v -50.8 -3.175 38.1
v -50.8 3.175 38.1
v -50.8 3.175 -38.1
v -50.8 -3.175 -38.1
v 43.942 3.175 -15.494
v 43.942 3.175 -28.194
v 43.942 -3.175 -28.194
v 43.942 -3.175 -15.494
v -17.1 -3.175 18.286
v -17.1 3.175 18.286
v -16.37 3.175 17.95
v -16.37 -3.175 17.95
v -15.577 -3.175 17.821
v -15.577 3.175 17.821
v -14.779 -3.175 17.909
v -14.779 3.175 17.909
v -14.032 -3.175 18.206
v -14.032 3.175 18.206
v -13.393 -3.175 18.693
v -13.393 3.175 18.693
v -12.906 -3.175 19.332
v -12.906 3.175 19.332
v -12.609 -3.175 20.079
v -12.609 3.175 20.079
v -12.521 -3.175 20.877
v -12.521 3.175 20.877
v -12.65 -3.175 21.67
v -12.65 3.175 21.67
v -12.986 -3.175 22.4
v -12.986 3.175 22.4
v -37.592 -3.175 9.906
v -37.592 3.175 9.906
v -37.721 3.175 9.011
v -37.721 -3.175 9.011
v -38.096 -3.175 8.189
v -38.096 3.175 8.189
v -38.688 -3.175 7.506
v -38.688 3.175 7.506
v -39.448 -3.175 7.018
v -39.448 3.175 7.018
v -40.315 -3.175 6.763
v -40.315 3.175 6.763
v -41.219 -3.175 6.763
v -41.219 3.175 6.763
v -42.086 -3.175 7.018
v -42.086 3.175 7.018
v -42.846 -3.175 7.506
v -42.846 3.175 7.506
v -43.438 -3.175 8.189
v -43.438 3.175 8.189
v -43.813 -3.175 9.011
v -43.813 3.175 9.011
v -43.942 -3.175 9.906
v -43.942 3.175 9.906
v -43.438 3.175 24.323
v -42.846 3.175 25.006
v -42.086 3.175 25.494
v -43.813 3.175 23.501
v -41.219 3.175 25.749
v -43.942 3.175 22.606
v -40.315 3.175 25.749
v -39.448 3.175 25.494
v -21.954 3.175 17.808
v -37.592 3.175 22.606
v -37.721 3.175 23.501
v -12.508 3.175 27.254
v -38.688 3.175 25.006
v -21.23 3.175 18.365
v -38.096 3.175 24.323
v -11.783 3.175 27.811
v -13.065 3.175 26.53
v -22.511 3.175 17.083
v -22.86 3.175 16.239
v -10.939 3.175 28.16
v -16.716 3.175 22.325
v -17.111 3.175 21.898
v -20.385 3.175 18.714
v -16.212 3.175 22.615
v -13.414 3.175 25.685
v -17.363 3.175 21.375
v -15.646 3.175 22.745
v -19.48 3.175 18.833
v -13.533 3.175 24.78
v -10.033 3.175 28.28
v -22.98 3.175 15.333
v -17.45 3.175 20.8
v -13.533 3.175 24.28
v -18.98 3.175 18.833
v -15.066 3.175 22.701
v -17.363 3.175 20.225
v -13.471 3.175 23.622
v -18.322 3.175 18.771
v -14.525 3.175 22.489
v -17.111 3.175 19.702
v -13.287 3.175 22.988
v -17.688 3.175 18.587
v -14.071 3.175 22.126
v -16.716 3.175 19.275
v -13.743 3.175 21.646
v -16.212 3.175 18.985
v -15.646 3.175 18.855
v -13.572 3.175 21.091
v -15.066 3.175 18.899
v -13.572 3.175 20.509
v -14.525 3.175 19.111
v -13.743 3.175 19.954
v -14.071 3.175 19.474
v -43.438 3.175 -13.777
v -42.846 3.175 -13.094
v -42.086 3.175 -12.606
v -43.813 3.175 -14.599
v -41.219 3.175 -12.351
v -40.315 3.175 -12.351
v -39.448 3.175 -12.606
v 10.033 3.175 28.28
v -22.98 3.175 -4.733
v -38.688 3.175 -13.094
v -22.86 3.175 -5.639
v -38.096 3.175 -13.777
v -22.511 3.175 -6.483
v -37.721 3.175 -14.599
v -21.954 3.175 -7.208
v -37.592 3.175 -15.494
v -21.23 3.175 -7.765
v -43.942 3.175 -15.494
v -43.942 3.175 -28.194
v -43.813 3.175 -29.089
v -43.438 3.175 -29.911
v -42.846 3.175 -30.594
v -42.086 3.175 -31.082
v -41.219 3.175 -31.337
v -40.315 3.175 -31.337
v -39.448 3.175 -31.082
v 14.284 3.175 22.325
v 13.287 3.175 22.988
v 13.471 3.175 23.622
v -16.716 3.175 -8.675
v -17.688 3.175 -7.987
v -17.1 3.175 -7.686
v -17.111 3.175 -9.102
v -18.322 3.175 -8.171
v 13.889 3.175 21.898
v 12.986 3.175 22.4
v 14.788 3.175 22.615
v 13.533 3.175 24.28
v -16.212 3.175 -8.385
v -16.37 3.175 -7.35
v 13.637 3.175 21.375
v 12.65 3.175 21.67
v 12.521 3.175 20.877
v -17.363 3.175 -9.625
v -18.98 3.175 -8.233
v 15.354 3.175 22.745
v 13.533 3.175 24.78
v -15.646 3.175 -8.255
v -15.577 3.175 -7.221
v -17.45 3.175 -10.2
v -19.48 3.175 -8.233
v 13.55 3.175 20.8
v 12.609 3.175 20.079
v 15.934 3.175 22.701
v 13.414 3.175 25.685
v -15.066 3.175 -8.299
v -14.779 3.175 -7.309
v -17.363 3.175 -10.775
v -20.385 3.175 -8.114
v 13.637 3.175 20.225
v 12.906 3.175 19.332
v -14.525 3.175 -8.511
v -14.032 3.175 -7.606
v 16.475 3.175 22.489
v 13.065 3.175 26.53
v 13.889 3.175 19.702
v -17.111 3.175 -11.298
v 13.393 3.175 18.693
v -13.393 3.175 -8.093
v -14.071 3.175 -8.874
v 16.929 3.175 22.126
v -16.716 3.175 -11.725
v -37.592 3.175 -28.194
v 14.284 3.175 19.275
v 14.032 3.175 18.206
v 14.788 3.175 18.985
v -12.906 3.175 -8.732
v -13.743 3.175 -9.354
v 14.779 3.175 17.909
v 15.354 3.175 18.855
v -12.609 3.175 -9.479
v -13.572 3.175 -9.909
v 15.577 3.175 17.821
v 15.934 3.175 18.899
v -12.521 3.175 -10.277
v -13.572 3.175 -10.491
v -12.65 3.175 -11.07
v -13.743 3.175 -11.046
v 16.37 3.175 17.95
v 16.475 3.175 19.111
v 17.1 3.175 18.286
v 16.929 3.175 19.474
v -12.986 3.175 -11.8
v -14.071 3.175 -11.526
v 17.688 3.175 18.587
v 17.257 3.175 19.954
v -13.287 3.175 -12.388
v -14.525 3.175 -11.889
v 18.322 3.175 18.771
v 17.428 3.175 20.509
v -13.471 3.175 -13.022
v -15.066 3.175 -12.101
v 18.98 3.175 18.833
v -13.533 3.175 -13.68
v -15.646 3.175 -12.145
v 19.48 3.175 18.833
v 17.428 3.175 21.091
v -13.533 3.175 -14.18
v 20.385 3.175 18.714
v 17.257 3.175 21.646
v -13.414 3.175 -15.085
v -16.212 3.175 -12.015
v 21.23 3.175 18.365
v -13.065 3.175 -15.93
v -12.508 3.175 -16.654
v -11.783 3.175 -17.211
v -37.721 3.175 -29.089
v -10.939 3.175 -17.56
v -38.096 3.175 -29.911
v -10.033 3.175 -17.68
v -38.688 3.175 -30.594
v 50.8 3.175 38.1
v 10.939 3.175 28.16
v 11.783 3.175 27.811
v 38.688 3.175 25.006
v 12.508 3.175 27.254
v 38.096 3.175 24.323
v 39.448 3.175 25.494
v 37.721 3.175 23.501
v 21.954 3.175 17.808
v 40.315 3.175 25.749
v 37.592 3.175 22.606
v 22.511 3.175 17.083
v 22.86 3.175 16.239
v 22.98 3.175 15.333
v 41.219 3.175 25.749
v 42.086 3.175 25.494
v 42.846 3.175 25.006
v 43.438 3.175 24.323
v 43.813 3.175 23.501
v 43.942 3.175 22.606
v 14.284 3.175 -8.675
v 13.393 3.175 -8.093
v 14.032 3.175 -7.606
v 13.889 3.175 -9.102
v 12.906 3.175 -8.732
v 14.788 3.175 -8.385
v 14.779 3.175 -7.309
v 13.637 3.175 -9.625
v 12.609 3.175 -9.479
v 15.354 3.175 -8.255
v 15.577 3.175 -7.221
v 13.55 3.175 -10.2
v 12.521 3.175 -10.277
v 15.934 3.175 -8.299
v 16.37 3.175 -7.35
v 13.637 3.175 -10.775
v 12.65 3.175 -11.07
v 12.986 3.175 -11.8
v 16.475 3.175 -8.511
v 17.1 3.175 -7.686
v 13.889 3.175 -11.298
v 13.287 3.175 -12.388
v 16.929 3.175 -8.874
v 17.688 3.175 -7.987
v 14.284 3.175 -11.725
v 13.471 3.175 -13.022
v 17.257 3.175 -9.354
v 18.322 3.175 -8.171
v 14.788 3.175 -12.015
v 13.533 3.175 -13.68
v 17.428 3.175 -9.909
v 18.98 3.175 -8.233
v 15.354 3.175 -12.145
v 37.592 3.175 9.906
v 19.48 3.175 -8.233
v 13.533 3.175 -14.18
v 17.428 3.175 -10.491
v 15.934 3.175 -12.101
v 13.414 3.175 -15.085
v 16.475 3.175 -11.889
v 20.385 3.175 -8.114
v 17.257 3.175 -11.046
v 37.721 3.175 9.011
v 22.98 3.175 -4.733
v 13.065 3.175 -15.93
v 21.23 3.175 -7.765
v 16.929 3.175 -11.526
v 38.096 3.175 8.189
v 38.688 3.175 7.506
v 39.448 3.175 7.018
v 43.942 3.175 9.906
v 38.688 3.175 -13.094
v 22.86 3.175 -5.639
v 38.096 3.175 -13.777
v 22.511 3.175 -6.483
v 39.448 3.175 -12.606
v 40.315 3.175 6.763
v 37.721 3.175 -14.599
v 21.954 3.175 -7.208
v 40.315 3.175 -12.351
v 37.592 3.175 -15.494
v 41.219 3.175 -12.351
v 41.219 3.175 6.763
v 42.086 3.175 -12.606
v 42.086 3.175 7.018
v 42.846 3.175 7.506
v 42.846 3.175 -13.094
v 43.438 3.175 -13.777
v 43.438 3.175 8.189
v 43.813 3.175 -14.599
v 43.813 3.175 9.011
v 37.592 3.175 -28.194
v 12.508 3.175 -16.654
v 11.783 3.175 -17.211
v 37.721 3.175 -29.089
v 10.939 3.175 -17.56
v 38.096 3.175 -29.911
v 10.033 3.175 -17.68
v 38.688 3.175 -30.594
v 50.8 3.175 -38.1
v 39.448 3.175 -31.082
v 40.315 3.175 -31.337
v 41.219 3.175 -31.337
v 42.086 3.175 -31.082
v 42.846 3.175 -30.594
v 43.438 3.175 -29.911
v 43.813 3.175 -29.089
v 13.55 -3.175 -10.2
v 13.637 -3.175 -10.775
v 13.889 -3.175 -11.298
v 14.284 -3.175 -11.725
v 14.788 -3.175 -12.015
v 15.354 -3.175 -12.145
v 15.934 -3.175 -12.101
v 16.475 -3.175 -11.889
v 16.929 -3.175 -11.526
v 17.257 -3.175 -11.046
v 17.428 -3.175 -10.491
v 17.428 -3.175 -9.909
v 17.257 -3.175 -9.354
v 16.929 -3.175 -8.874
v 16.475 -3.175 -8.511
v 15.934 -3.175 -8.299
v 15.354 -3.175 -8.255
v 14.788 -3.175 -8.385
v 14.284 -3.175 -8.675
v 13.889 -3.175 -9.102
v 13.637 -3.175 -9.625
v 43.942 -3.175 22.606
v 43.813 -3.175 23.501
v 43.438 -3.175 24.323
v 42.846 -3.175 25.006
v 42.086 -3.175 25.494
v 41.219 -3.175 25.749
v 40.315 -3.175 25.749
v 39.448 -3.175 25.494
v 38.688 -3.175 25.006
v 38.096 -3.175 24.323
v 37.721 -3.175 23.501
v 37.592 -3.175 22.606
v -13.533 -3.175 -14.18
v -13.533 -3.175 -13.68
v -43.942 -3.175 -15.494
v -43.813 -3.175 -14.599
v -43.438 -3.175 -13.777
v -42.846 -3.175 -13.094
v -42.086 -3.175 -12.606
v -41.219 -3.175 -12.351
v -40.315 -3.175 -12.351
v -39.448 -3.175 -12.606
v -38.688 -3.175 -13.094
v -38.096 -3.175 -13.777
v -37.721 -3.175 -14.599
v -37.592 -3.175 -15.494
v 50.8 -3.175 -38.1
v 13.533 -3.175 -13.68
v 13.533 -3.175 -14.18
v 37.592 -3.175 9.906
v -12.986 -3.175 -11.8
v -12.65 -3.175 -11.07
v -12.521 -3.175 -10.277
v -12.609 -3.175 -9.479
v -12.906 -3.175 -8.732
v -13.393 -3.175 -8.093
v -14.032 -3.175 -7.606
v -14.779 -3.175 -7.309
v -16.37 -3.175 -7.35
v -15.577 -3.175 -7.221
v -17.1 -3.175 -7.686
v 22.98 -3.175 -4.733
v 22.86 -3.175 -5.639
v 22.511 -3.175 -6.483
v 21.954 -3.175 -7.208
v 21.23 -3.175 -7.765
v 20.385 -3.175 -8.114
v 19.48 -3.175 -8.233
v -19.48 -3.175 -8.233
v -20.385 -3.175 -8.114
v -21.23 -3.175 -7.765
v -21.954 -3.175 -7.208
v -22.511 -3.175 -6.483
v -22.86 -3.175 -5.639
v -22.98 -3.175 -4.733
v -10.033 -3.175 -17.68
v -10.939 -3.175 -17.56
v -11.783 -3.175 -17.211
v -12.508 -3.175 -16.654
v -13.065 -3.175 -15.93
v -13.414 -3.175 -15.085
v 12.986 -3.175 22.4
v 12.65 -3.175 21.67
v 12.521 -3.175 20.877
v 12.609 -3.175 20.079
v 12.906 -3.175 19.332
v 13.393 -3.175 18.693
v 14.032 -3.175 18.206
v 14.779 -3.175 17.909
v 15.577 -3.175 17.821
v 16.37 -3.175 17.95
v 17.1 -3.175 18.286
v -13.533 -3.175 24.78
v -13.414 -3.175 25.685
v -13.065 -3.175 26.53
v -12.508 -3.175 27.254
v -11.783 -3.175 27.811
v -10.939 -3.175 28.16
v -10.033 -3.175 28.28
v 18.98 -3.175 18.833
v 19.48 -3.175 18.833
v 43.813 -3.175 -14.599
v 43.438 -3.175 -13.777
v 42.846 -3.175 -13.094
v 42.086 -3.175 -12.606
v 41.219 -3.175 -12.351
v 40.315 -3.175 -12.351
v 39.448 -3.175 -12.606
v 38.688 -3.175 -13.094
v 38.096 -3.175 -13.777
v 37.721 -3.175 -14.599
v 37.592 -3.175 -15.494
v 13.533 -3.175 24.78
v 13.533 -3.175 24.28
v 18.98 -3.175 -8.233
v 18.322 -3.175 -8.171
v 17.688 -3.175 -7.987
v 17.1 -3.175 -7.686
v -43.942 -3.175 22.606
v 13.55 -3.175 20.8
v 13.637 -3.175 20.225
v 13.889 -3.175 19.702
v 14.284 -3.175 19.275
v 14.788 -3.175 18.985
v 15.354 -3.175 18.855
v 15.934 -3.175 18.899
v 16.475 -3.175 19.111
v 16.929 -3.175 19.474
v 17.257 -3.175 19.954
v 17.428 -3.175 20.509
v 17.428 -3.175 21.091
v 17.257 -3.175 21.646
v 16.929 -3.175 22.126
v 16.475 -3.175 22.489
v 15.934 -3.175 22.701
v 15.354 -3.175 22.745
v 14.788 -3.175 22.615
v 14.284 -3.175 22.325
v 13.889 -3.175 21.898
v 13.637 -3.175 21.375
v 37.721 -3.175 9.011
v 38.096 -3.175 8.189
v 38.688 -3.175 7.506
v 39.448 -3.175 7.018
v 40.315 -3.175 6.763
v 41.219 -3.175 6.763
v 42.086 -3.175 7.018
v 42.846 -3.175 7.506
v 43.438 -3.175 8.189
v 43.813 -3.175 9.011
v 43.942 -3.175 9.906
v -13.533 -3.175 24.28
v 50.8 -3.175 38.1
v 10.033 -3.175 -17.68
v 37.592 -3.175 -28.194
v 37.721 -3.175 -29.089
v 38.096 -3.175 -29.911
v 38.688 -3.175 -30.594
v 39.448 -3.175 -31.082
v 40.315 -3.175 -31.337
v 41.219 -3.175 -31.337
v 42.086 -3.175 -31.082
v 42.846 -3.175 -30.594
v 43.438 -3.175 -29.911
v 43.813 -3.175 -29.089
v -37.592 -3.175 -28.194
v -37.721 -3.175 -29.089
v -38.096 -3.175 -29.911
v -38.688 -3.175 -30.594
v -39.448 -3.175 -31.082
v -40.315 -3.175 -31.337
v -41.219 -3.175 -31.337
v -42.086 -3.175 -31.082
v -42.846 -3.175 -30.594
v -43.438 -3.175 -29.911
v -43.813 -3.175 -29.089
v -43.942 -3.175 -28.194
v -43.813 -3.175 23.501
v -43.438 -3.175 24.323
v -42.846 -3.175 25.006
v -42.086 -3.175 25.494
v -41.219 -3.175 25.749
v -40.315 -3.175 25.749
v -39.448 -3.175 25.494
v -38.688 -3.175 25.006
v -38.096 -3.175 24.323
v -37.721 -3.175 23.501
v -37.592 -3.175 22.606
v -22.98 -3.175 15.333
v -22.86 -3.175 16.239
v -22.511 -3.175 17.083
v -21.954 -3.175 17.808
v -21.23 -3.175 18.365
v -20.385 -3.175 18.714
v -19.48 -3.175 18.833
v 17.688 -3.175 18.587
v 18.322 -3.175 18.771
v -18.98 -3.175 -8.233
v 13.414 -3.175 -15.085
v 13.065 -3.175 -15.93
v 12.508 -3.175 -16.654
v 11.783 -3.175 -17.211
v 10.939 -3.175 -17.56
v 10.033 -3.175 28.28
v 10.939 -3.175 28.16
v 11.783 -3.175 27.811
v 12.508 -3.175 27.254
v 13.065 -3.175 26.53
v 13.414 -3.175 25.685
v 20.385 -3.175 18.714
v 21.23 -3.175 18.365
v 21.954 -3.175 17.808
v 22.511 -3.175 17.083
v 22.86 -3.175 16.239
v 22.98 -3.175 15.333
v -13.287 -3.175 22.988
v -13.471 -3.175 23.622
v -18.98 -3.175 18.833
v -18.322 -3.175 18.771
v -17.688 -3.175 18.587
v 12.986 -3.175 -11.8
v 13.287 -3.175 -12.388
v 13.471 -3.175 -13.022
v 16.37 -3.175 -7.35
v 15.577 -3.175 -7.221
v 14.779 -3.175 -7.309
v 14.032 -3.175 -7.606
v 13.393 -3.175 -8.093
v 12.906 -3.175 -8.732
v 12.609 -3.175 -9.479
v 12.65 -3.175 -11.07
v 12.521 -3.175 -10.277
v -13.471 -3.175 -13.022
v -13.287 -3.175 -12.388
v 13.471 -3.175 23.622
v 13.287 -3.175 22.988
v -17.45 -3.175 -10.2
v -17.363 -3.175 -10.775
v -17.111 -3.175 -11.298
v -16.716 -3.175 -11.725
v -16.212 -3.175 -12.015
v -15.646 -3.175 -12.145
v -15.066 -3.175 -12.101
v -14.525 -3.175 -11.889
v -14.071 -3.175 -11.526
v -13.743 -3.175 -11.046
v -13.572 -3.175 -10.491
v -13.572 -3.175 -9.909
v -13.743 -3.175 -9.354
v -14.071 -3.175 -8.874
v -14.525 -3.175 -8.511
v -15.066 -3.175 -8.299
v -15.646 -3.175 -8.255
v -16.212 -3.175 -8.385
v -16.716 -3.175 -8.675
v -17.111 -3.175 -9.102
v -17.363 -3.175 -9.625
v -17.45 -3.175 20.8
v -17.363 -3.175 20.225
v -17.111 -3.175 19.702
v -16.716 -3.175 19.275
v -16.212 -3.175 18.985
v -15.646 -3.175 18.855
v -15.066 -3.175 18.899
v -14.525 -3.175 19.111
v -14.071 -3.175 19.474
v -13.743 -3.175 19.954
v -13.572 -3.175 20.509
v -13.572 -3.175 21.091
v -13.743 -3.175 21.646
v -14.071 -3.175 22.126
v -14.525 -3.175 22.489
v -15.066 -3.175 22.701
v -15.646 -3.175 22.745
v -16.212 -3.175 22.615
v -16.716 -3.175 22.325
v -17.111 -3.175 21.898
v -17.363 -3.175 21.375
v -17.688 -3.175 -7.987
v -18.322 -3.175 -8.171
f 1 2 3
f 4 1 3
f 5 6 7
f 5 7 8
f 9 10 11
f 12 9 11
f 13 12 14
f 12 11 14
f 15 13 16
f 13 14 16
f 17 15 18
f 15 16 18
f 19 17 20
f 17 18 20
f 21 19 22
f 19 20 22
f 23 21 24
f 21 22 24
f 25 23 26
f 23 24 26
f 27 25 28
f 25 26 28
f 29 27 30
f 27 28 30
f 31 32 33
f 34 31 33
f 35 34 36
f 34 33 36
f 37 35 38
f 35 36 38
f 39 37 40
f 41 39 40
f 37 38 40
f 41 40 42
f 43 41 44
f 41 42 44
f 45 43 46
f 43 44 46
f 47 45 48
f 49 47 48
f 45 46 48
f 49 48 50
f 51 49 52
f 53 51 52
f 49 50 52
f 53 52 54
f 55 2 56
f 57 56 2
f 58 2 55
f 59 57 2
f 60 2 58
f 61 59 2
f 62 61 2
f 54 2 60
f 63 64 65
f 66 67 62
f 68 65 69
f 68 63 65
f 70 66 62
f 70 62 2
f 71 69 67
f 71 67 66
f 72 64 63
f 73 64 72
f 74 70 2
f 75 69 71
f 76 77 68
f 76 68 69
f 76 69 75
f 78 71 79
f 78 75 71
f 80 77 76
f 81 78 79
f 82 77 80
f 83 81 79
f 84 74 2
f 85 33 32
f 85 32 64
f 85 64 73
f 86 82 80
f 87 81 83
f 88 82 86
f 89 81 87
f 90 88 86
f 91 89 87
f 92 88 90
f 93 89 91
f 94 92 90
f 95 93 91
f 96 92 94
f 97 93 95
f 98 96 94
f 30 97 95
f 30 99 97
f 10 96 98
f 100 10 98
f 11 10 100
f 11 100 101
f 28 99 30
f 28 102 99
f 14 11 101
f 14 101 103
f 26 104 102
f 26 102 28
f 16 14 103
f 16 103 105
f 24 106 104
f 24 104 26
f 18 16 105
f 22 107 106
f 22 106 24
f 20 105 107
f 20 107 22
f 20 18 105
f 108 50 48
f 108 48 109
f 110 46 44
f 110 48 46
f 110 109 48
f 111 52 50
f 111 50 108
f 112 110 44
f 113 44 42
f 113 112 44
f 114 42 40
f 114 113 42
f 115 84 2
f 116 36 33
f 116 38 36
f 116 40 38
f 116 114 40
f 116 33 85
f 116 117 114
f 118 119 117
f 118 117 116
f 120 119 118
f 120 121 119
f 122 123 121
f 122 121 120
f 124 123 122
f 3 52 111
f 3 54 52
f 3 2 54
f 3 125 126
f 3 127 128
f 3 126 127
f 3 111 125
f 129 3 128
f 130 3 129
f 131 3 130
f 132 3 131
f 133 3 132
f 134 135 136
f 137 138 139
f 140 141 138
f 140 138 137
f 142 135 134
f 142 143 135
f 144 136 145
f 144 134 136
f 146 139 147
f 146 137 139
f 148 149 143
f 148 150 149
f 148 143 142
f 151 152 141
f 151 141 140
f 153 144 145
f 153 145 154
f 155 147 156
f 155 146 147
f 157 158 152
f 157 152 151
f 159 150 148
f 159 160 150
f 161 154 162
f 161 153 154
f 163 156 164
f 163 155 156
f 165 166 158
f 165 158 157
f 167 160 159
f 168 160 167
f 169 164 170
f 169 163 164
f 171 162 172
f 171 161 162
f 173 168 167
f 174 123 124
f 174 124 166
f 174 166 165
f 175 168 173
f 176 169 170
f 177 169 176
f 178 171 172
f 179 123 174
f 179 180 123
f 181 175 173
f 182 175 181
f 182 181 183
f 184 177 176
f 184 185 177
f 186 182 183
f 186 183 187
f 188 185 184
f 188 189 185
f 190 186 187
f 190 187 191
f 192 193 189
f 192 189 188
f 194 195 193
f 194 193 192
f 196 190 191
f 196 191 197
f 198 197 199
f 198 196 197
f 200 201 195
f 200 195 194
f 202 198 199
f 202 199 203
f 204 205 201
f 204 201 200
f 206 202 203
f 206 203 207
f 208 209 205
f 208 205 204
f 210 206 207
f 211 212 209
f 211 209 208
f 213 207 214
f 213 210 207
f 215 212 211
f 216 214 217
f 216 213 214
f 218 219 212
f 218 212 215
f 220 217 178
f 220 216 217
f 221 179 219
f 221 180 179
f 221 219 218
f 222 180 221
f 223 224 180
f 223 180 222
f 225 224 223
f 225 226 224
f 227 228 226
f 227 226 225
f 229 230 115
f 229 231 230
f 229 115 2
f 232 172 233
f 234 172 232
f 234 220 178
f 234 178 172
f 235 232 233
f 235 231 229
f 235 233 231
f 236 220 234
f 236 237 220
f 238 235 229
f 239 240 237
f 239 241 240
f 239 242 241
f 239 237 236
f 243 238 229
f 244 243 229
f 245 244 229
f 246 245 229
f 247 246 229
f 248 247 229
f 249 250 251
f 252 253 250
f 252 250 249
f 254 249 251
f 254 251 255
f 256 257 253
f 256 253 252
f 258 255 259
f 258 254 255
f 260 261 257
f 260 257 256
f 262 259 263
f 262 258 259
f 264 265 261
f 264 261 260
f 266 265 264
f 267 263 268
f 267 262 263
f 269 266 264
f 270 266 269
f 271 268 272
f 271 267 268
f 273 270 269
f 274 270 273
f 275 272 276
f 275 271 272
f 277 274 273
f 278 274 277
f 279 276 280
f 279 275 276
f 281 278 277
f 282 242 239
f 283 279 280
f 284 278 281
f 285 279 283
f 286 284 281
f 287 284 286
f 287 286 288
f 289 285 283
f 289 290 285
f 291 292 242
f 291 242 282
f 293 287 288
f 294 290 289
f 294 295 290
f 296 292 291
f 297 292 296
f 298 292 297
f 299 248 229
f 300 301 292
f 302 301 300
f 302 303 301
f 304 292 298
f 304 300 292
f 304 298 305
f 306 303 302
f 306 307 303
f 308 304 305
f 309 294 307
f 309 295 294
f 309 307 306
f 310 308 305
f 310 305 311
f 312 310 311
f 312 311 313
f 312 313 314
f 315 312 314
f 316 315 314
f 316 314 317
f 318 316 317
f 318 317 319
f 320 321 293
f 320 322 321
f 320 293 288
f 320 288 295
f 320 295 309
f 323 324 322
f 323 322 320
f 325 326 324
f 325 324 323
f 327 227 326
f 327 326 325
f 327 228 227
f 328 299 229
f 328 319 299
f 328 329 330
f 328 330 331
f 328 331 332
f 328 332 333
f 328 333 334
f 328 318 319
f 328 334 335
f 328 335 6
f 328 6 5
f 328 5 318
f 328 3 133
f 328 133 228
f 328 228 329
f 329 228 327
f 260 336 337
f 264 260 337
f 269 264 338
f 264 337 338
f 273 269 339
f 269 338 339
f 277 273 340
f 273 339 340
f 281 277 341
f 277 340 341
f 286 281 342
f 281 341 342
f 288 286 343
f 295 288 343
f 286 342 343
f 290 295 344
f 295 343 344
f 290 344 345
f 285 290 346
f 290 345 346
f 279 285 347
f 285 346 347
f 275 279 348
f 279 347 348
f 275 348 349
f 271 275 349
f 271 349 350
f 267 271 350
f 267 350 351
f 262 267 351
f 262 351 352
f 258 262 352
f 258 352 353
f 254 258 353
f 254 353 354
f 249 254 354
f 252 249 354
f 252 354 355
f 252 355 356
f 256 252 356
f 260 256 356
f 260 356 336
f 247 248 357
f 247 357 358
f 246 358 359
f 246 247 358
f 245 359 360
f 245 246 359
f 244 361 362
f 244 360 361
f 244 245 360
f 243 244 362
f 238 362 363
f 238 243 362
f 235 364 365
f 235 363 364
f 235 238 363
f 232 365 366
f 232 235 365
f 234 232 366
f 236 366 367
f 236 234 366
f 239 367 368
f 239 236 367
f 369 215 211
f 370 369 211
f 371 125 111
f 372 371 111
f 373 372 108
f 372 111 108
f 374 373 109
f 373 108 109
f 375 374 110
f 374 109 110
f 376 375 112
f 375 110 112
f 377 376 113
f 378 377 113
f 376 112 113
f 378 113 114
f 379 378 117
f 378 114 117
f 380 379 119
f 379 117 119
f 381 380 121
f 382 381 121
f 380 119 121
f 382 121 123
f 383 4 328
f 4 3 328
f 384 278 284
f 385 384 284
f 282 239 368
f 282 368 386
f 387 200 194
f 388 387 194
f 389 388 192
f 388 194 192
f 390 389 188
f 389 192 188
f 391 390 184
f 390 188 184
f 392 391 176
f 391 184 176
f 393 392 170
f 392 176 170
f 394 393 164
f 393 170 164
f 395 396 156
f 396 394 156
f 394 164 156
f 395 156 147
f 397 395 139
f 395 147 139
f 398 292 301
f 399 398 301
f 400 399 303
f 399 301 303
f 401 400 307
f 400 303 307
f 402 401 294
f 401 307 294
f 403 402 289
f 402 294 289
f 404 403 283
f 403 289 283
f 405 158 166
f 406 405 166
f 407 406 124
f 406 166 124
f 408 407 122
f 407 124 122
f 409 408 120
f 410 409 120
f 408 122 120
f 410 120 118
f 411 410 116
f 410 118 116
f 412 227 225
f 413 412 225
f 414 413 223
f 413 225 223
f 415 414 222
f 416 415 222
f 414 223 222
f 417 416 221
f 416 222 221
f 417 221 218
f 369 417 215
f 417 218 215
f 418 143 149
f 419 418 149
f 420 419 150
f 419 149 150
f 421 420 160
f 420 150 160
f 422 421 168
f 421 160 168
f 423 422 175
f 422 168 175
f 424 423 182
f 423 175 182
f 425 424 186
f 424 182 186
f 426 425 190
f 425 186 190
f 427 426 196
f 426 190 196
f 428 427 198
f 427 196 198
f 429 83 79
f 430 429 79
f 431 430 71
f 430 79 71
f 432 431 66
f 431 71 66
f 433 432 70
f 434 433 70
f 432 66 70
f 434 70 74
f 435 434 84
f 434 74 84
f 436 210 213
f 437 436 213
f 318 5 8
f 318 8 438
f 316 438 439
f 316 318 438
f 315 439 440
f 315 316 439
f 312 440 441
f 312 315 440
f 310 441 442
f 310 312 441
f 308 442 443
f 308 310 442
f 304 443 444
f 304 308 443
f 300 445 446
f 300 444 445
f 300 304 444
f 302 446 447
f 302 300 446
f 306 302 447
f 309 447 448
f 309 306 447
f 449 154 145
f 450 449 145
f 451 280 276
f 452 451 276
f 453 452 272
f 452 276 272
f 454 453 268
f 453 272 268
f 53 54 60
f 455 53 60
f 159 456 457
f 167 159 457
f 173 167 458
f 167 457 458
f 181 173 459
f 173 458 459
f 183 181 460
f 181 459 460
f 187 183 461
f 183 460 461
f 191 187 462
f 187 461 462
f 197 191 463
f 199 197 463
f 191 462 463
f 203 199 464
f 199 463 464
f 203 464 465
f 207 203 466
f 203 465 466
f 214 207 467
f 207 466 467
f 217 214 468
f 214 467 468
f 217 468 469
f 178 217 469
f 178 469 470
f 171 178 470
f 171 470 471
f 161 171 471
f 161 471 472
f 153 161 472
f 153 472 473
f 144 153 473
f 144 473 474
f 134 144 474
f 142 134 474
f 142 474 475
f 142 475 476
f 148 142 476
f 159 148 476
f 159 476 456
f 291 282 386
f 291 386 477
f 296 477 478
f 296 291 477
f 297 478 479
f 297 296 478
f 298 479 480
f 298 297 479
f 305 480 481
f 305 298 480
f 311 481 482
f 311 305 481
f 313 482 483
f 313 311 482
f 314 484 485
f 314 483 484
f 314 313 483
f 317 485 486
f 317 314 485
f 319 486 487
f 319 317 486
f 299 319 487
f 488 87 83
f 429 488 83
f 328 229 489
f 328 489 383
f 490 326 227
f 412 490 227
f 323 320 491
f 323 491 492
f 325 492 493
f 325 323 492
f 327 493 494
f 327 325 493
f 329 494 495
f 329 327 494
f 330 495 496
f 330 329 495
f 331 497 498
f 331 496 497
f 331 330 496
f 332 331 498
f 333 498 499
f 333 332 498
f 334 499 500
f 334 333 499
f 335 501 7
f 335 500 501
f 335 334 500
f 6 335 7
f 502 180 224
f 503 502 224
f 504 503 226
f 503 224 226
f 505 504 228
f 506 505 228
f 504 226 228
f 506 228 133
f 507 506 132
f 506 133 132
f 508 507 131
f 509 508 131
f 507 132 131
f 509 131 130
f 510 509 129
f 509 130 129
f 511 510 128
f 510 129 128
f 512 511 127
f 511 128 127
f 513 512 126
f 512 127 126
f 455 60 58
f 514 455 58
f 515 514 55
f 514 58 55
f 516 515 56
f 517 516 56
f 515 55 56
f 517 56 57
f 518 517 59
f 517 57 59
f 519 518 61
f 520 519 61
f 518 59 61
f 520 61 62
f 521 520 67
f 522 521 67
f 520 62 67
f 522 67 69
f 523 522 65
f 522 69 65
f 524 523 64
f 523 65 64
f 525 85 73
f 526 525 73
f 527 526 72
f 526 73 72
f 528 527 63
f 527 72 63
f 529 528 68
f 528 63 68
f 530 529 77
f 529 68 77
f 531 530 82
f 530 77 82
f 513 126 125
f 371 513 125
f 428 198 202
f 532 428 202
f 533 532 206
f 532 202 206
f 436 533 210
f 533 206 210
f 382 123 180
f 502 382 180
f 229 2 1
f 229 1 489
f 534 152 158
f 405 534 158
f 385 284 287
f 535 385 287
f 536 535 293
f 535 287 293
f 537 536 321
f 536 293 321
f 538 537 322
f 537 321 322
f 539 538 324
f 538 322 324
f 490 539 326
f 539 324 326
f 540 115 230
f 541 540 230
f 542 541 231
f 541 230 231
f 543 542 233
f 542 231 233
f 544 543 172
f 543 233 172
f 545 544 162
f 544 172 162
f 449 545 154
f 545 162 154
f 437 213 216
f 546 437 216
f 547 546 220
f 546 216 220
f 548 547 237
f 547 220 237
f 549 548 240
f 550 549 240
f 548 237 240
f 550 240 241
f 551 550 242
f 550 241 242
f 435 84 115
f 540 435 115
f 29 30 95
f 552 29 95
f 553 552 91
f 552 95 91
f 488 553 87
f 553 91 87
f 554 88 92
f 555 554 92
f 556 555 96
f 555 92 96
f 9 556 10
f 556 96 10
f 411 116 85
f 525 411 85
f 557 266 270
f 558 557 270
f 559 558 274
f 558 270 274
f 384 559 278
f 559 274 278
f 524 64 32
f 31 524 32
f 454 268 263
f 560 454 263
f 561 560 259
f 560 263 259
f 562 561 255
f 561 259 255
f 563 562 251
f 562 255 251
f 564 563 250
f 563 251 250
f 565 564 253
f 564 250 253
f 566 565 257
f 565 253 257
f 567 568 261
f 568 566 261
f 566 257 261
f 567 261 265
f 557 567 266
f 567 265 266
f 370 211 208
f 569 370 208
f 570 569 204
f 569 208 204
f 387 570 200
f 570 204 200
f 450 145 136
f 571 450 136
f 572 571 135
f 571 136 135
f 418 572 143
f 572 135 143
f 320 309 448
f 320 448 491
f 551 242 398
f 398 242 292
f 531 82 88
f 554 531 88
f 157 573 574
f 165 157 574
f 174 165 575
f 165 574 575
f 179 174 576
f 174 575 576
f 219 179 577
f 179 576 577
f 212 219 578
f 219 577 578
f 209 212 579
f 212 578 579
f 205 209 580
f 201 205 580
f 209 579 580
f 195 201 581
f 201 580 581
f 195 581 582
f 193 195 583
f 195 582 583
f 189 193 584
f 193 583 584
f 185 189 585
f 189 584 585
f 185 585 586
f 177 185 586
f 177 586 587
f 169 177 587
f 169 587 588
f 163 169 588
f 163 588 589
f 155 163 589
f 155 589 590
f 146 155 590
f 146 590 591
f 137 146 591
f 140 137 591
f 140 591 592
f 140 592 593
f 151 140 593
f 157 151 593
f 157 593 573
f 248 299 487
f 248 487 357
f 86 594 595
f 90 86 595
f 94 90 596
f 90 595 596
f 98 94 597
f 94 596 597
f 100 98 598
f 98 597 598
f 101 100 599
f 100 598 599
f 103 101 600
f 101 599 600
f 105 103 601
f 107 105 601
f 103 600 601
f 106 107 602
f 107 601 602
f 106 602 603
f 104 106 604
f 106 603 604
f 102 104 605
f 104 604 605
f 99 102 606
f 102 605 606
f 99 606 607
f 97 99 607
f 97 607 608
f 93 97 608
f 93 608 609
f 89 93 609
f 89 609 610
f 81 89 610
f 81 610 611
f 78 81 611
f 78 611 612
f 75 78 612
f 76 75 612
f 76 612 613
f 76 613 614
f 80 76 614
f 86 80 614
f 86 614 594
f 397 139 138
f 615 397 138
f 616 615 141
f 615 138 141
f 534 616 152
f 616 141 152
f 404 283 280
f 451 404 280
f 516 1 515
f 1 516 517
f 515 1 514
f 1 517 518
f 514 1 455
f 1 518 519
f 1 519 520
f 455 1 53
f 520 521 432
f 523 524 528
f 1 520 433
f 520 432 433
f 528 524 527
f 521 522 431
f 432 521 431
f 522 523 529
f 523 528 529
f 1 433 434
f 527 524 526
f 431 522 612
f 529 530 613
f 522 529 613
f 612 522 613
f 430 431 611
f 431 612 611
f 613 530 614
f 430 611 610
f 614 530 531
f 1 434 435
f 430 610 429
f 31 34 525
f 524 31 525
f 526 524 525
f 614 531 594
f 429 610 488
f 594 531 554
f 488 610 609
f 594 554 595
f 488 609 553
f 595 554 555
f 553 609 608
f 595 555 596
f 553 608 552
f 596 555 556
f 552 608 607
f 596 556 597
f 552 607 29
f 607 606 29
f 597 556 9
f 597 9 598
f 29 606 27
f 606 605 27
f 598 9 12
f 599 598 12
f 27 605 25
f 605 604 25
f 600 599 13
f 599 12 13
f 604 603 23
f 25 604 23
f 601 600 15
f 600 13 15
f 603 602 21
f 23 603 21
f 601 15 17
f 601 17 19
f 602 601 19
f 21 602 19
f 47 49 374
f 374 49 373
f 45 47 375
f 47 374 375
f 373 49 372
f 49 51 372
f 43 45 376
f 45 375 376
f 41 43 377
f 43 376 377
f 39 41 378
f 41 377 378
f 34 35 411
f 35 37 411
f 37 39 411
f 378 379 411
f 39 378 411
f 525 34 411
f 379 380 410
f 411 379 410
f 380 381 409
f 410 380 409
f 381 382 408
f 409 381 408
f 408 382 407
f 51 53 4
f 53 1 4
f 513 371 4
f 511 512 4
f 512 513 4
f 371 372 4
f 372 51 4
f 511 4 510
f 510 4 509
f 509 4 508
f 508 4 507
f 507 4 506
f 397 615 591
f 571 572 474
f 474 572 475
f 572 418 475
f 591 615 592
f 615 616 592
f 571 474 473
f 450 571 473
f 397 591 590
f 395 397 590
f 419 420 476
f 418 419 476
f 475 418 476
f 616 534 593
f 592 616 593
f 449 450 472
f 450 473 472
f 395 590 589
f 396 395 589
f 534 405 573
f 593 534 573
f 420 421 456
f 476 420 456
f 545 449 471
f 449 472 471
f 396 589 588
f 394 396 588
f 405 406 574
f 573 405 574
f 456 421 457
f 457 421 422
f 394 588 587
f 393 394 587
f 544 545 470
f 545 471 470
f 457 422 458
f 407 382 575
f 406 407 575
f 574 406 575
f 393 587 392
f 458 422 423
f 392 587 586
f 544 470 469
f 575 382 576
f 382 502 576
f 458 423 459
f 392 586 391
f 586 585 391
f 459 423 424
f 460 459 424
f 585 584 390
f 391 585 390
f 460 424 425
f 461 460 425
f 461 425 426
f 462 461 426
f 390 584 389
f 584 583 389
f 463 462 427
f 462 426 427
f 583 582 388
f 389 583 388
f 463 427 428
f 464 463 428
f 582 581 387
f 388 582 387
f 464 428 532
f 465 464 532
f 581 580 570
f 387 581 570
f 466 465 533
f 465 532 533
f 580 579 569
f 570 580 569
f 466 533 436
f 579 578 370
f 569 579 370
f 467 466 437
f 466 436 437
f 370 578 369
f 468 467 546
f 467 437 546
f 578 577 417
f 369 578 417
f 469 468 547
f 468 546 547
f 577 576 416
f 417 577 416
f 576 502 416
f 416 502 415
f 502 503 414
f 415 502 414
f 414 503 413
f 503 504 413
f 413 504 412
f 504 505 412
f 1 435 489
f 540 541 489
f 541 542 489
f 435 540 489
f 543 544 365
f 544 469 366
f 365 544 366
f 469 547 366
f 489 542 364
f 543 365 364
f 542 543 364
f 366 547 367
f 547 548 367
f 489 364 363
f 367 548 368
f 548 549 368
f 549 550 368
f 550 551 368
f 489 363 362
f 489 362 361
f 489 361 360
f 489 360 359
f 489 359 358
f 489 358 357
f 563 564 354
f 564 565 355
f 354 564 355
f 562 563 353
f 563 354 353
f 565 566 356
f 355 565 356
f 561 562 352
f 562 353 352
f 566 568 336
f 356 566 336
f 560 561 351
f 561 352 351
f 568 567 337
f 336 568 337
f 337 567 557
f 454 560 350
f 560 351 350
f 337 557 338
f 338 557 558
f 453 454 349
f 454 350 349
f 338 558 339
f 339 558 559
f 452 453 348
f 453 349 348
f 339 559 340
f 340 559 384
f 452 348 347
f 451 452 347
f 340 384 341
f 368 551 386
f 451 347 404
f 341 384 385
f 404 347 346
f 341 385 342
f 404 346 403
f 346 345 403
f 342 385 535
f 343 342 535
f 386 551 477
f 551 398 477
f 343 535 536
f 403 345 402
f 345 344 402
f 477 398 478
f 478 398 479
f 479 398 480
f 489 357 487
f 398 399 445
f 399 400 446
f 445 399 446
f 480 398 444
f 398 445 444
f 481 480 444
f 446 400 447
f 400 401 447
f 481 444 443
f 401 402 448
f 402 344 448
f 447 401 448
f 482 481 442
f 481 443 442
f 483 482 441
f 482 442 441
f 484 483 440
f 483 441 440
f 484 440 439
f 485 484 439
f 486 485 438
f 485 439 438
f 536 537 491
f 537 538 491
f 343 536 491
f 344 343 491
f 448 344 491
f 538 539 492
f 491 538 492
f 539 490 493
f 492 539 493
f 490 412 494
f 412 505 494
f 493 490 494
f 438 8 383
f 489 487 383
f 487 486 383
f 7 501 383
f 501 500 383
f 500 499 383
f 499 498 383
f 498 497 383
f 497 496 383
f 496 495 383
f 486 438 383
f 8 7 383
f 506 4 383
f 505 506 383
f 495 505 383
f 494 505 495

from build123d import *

# Parameters (mm, degrees)
SKETCH1_W              = 101.6
SKETCH1_H              = 76.2
BOSS_EXTRUDE1_DEPTH    = 3.175
M3_5_CLEARANCE_HOLE1_D = 3.9
CUT_EXTRUDE6_DEPTH     = 64.816710194
CUT_EXTRUDE7_DEPTH     = 64.816710194
CIRPATTERN1_COUNT      = 4
CUT_EXTRUDE8_DEPTH     = 64.816710194


with BuildPart() as part:
    # Sketch1 → Boss-Extrude1 (new, symmetric)
    with BuildSketch(Plane(origin=(0, 0, 0), x_dir=(1, 0, 0), z_dir=(0, 1, 0))):
        Rectangle(SKETCH1_W, SKETCH1_H)
    extrude(amount=BOSS_EXTRUDE1_DEPTH, both=True)

    # M3.5 Clearance Hole1 (through all)
    with Locations(Plane(origin=(0, 3.175, 0), x_dir=(1, 0, 0), z_dir=(0, 1, 0))):
        with Locations((-15.5, 10.2), (15.5, 10.2), (15.5, -20.8), (-15.5, -20.8)):
            Hole(M3_5_CLEARANCE_HOLE1_D / 2)

    # Sketch23 → Cut-Extrude6 (cut, through all)
    with BuildSketch(Plane(origin=(0, 3.175, 0), x_dir=(1, 0, 0), z_dir=(0, 1, 0))):
        with BuildLine():
            Line((-12.9860741, 15.72), (-12.9860741, 11.800180167))
            ThreePointArc((-12.9860741, 11.800180167), (-13.392821792, 8.092821792), (-17.100180167, 7.6860741))
            Line((-17.100180167, 7.6860741), (-21.02, 7.6860741))
            Line((-21.02, 7.6860741), (-21.02, -18.2860741))
            Line((-21.02, -18.2860741), (-17.100180167, -18.2860741))
            ThreePointArc((-17.100180167, -18.2860741), (-13.392821792, -18.692821792), (-12.9860741, -22.400180167))
            Line((-12.9860741, -22.400180167), (-12.9860741, -26.32))
            Line((-12.9860741, -26.32), (12.9860741, -26.32))
            Line((12.9860741, -26.32), (12.9860741, -22.400180167))
            ThreePointArc((12.9860741, -22.400180167), (13.392821792, -18.692821792), (17.100180167, -18.2860741))
            Line((17.100180167, -18.2860741), (21.02, -18.2860741))
            Line((21.02, -18.2860741), (21.02, 7.6860741))
            Line((21.02, 7.6860741), (17.100180167, 7.6860741))
            ThreePointArc((17.100180167, 7.6860741), (13.392821792, 8.092821792), (12.9860741, 11.800180167))
            Line((12.9860741, 11.800180167), (12.9860741, 15.72))
            Line((12.9860741, 15.72), (-12.9860741, 15.72))
        make_face()
    extrude(amount=-CUT_EXTRUDE6_DEPTH, mode=Mode.SUBTRACT)

    # Sketch24 → Cut-Extrude7 (cut, through all)
    with BuildSketch(Plane(origin=(0, 3.175, 0), x_dir=(1, 0, 0), z_dir=(0, 1, 0))):
        with BuildLine():
            Line((-18.979586404, 8.233476566), (-19.479586404, 8.233476566))
            ThreePointArc((-19.479586404, 8.233476566), (-21.954460139, 7.2083503), (-22.979586404, 4.733476566))
            Line((-22.979586404, 4.733476566), (-22.979586404, -15.333476566))
            ThreePointArc((-22.979586404, -15.333476566), (-21.954460139, -17.8083503), (-19.479586404, -18.833476566))
            Line((-19.479586404, -18.833476566), (-18.979586404, -18.833476566))
            ThreePointArc((-18.979586404, -18.833476566), (-18.000834998, -18.693840487), (-17.100180167, -18.2860741))
            ThreePointArc((-17.100180167, -18.2860741), (-13.392821792, -18.692821792), (-12.9860741, -22.400180167))
            Line((-12.9860741, -22.400180167), (-7.9860741, -22.400180167))
            Line((-7.9860741, -22.400180167), (-7.9860741, 11.800180167))
            Line((-7.9860741, 11.800180167), (-12.9860741, 11.800180167))
            ThreePointArc((-12.9860741, 11.800180167), (-13.392821792, 8.092821792), (-17.100180167, 7.6860741))
            ThreePointArc((-17.100180167, 7.6860741), (-18.000834998, 8.093840487), (-18.979586404, 8.233476566))
        make_face()
    cut_extrude7 = extrude(amount=-CUT_EXTRUDE7_DEPTH, mode=Mode.SUBTRACT)

    # CirPattern1: Cut-Extrude7 ×4 about axis
    cirpattern1_axis = Axis((0, 3.175, 5.3), (0, 1, 0))
    for i in range(1, CIRPATTERN1_COUNT):
        add(cut_extrude7.rotate(cirpattern1_axis, i * 360 / CIRPATTERN1_COUNT), mode=Mode.SUBTRACT)

    # Sketch25 → Cut-Extrude8 (cut, through all)
    with BuildSketch(Plane(origin=(0, 3.175, 0), x_dir=(1, 0, 0), z_dir=(0, 1, 0))):
        with BuildLine():
            Line((-43.942, 28.194), (-43.942, 15.494))
            ThreePointArc((-43.942, 15.494), (-40.767, 12.319), (-37.592, 15.494))
            Line((-37.592, 15.494), (-37.592, 28.194))
            ThreePointArc((-37.592, 28.194), (-40.767, 31.369), (-43.942, 28.194))
        make_face()
        with BuildLine():
            Line((-43.942, -9.906), (-43.942, -22.606))
            ThreePointArc((-43.942, -22.606), (-40.767, -25.781), (-37.592, -22.606))
            Line((-37.592, -22.606), (-37.592, -9.906))
            ThreePointArc((-37.592, -9.906), (-40.767, -6.731), (-43.942, -9.906))
        make_face()
    cut_extrude8 = extrude(amount=-CUT_EXTRUDE8_DEPTH, mode=Mode.SUBTRACT)

    # Mirror1: Cut-Extrude8 across plane
    add(cut_extrude8.mirror(Plane(origin=(0, 0, 0), x_dir=(0, 0, 1), z_dir=(1, 0, 0))), mode=Mode.SUBTRACT)


solid = part.part
